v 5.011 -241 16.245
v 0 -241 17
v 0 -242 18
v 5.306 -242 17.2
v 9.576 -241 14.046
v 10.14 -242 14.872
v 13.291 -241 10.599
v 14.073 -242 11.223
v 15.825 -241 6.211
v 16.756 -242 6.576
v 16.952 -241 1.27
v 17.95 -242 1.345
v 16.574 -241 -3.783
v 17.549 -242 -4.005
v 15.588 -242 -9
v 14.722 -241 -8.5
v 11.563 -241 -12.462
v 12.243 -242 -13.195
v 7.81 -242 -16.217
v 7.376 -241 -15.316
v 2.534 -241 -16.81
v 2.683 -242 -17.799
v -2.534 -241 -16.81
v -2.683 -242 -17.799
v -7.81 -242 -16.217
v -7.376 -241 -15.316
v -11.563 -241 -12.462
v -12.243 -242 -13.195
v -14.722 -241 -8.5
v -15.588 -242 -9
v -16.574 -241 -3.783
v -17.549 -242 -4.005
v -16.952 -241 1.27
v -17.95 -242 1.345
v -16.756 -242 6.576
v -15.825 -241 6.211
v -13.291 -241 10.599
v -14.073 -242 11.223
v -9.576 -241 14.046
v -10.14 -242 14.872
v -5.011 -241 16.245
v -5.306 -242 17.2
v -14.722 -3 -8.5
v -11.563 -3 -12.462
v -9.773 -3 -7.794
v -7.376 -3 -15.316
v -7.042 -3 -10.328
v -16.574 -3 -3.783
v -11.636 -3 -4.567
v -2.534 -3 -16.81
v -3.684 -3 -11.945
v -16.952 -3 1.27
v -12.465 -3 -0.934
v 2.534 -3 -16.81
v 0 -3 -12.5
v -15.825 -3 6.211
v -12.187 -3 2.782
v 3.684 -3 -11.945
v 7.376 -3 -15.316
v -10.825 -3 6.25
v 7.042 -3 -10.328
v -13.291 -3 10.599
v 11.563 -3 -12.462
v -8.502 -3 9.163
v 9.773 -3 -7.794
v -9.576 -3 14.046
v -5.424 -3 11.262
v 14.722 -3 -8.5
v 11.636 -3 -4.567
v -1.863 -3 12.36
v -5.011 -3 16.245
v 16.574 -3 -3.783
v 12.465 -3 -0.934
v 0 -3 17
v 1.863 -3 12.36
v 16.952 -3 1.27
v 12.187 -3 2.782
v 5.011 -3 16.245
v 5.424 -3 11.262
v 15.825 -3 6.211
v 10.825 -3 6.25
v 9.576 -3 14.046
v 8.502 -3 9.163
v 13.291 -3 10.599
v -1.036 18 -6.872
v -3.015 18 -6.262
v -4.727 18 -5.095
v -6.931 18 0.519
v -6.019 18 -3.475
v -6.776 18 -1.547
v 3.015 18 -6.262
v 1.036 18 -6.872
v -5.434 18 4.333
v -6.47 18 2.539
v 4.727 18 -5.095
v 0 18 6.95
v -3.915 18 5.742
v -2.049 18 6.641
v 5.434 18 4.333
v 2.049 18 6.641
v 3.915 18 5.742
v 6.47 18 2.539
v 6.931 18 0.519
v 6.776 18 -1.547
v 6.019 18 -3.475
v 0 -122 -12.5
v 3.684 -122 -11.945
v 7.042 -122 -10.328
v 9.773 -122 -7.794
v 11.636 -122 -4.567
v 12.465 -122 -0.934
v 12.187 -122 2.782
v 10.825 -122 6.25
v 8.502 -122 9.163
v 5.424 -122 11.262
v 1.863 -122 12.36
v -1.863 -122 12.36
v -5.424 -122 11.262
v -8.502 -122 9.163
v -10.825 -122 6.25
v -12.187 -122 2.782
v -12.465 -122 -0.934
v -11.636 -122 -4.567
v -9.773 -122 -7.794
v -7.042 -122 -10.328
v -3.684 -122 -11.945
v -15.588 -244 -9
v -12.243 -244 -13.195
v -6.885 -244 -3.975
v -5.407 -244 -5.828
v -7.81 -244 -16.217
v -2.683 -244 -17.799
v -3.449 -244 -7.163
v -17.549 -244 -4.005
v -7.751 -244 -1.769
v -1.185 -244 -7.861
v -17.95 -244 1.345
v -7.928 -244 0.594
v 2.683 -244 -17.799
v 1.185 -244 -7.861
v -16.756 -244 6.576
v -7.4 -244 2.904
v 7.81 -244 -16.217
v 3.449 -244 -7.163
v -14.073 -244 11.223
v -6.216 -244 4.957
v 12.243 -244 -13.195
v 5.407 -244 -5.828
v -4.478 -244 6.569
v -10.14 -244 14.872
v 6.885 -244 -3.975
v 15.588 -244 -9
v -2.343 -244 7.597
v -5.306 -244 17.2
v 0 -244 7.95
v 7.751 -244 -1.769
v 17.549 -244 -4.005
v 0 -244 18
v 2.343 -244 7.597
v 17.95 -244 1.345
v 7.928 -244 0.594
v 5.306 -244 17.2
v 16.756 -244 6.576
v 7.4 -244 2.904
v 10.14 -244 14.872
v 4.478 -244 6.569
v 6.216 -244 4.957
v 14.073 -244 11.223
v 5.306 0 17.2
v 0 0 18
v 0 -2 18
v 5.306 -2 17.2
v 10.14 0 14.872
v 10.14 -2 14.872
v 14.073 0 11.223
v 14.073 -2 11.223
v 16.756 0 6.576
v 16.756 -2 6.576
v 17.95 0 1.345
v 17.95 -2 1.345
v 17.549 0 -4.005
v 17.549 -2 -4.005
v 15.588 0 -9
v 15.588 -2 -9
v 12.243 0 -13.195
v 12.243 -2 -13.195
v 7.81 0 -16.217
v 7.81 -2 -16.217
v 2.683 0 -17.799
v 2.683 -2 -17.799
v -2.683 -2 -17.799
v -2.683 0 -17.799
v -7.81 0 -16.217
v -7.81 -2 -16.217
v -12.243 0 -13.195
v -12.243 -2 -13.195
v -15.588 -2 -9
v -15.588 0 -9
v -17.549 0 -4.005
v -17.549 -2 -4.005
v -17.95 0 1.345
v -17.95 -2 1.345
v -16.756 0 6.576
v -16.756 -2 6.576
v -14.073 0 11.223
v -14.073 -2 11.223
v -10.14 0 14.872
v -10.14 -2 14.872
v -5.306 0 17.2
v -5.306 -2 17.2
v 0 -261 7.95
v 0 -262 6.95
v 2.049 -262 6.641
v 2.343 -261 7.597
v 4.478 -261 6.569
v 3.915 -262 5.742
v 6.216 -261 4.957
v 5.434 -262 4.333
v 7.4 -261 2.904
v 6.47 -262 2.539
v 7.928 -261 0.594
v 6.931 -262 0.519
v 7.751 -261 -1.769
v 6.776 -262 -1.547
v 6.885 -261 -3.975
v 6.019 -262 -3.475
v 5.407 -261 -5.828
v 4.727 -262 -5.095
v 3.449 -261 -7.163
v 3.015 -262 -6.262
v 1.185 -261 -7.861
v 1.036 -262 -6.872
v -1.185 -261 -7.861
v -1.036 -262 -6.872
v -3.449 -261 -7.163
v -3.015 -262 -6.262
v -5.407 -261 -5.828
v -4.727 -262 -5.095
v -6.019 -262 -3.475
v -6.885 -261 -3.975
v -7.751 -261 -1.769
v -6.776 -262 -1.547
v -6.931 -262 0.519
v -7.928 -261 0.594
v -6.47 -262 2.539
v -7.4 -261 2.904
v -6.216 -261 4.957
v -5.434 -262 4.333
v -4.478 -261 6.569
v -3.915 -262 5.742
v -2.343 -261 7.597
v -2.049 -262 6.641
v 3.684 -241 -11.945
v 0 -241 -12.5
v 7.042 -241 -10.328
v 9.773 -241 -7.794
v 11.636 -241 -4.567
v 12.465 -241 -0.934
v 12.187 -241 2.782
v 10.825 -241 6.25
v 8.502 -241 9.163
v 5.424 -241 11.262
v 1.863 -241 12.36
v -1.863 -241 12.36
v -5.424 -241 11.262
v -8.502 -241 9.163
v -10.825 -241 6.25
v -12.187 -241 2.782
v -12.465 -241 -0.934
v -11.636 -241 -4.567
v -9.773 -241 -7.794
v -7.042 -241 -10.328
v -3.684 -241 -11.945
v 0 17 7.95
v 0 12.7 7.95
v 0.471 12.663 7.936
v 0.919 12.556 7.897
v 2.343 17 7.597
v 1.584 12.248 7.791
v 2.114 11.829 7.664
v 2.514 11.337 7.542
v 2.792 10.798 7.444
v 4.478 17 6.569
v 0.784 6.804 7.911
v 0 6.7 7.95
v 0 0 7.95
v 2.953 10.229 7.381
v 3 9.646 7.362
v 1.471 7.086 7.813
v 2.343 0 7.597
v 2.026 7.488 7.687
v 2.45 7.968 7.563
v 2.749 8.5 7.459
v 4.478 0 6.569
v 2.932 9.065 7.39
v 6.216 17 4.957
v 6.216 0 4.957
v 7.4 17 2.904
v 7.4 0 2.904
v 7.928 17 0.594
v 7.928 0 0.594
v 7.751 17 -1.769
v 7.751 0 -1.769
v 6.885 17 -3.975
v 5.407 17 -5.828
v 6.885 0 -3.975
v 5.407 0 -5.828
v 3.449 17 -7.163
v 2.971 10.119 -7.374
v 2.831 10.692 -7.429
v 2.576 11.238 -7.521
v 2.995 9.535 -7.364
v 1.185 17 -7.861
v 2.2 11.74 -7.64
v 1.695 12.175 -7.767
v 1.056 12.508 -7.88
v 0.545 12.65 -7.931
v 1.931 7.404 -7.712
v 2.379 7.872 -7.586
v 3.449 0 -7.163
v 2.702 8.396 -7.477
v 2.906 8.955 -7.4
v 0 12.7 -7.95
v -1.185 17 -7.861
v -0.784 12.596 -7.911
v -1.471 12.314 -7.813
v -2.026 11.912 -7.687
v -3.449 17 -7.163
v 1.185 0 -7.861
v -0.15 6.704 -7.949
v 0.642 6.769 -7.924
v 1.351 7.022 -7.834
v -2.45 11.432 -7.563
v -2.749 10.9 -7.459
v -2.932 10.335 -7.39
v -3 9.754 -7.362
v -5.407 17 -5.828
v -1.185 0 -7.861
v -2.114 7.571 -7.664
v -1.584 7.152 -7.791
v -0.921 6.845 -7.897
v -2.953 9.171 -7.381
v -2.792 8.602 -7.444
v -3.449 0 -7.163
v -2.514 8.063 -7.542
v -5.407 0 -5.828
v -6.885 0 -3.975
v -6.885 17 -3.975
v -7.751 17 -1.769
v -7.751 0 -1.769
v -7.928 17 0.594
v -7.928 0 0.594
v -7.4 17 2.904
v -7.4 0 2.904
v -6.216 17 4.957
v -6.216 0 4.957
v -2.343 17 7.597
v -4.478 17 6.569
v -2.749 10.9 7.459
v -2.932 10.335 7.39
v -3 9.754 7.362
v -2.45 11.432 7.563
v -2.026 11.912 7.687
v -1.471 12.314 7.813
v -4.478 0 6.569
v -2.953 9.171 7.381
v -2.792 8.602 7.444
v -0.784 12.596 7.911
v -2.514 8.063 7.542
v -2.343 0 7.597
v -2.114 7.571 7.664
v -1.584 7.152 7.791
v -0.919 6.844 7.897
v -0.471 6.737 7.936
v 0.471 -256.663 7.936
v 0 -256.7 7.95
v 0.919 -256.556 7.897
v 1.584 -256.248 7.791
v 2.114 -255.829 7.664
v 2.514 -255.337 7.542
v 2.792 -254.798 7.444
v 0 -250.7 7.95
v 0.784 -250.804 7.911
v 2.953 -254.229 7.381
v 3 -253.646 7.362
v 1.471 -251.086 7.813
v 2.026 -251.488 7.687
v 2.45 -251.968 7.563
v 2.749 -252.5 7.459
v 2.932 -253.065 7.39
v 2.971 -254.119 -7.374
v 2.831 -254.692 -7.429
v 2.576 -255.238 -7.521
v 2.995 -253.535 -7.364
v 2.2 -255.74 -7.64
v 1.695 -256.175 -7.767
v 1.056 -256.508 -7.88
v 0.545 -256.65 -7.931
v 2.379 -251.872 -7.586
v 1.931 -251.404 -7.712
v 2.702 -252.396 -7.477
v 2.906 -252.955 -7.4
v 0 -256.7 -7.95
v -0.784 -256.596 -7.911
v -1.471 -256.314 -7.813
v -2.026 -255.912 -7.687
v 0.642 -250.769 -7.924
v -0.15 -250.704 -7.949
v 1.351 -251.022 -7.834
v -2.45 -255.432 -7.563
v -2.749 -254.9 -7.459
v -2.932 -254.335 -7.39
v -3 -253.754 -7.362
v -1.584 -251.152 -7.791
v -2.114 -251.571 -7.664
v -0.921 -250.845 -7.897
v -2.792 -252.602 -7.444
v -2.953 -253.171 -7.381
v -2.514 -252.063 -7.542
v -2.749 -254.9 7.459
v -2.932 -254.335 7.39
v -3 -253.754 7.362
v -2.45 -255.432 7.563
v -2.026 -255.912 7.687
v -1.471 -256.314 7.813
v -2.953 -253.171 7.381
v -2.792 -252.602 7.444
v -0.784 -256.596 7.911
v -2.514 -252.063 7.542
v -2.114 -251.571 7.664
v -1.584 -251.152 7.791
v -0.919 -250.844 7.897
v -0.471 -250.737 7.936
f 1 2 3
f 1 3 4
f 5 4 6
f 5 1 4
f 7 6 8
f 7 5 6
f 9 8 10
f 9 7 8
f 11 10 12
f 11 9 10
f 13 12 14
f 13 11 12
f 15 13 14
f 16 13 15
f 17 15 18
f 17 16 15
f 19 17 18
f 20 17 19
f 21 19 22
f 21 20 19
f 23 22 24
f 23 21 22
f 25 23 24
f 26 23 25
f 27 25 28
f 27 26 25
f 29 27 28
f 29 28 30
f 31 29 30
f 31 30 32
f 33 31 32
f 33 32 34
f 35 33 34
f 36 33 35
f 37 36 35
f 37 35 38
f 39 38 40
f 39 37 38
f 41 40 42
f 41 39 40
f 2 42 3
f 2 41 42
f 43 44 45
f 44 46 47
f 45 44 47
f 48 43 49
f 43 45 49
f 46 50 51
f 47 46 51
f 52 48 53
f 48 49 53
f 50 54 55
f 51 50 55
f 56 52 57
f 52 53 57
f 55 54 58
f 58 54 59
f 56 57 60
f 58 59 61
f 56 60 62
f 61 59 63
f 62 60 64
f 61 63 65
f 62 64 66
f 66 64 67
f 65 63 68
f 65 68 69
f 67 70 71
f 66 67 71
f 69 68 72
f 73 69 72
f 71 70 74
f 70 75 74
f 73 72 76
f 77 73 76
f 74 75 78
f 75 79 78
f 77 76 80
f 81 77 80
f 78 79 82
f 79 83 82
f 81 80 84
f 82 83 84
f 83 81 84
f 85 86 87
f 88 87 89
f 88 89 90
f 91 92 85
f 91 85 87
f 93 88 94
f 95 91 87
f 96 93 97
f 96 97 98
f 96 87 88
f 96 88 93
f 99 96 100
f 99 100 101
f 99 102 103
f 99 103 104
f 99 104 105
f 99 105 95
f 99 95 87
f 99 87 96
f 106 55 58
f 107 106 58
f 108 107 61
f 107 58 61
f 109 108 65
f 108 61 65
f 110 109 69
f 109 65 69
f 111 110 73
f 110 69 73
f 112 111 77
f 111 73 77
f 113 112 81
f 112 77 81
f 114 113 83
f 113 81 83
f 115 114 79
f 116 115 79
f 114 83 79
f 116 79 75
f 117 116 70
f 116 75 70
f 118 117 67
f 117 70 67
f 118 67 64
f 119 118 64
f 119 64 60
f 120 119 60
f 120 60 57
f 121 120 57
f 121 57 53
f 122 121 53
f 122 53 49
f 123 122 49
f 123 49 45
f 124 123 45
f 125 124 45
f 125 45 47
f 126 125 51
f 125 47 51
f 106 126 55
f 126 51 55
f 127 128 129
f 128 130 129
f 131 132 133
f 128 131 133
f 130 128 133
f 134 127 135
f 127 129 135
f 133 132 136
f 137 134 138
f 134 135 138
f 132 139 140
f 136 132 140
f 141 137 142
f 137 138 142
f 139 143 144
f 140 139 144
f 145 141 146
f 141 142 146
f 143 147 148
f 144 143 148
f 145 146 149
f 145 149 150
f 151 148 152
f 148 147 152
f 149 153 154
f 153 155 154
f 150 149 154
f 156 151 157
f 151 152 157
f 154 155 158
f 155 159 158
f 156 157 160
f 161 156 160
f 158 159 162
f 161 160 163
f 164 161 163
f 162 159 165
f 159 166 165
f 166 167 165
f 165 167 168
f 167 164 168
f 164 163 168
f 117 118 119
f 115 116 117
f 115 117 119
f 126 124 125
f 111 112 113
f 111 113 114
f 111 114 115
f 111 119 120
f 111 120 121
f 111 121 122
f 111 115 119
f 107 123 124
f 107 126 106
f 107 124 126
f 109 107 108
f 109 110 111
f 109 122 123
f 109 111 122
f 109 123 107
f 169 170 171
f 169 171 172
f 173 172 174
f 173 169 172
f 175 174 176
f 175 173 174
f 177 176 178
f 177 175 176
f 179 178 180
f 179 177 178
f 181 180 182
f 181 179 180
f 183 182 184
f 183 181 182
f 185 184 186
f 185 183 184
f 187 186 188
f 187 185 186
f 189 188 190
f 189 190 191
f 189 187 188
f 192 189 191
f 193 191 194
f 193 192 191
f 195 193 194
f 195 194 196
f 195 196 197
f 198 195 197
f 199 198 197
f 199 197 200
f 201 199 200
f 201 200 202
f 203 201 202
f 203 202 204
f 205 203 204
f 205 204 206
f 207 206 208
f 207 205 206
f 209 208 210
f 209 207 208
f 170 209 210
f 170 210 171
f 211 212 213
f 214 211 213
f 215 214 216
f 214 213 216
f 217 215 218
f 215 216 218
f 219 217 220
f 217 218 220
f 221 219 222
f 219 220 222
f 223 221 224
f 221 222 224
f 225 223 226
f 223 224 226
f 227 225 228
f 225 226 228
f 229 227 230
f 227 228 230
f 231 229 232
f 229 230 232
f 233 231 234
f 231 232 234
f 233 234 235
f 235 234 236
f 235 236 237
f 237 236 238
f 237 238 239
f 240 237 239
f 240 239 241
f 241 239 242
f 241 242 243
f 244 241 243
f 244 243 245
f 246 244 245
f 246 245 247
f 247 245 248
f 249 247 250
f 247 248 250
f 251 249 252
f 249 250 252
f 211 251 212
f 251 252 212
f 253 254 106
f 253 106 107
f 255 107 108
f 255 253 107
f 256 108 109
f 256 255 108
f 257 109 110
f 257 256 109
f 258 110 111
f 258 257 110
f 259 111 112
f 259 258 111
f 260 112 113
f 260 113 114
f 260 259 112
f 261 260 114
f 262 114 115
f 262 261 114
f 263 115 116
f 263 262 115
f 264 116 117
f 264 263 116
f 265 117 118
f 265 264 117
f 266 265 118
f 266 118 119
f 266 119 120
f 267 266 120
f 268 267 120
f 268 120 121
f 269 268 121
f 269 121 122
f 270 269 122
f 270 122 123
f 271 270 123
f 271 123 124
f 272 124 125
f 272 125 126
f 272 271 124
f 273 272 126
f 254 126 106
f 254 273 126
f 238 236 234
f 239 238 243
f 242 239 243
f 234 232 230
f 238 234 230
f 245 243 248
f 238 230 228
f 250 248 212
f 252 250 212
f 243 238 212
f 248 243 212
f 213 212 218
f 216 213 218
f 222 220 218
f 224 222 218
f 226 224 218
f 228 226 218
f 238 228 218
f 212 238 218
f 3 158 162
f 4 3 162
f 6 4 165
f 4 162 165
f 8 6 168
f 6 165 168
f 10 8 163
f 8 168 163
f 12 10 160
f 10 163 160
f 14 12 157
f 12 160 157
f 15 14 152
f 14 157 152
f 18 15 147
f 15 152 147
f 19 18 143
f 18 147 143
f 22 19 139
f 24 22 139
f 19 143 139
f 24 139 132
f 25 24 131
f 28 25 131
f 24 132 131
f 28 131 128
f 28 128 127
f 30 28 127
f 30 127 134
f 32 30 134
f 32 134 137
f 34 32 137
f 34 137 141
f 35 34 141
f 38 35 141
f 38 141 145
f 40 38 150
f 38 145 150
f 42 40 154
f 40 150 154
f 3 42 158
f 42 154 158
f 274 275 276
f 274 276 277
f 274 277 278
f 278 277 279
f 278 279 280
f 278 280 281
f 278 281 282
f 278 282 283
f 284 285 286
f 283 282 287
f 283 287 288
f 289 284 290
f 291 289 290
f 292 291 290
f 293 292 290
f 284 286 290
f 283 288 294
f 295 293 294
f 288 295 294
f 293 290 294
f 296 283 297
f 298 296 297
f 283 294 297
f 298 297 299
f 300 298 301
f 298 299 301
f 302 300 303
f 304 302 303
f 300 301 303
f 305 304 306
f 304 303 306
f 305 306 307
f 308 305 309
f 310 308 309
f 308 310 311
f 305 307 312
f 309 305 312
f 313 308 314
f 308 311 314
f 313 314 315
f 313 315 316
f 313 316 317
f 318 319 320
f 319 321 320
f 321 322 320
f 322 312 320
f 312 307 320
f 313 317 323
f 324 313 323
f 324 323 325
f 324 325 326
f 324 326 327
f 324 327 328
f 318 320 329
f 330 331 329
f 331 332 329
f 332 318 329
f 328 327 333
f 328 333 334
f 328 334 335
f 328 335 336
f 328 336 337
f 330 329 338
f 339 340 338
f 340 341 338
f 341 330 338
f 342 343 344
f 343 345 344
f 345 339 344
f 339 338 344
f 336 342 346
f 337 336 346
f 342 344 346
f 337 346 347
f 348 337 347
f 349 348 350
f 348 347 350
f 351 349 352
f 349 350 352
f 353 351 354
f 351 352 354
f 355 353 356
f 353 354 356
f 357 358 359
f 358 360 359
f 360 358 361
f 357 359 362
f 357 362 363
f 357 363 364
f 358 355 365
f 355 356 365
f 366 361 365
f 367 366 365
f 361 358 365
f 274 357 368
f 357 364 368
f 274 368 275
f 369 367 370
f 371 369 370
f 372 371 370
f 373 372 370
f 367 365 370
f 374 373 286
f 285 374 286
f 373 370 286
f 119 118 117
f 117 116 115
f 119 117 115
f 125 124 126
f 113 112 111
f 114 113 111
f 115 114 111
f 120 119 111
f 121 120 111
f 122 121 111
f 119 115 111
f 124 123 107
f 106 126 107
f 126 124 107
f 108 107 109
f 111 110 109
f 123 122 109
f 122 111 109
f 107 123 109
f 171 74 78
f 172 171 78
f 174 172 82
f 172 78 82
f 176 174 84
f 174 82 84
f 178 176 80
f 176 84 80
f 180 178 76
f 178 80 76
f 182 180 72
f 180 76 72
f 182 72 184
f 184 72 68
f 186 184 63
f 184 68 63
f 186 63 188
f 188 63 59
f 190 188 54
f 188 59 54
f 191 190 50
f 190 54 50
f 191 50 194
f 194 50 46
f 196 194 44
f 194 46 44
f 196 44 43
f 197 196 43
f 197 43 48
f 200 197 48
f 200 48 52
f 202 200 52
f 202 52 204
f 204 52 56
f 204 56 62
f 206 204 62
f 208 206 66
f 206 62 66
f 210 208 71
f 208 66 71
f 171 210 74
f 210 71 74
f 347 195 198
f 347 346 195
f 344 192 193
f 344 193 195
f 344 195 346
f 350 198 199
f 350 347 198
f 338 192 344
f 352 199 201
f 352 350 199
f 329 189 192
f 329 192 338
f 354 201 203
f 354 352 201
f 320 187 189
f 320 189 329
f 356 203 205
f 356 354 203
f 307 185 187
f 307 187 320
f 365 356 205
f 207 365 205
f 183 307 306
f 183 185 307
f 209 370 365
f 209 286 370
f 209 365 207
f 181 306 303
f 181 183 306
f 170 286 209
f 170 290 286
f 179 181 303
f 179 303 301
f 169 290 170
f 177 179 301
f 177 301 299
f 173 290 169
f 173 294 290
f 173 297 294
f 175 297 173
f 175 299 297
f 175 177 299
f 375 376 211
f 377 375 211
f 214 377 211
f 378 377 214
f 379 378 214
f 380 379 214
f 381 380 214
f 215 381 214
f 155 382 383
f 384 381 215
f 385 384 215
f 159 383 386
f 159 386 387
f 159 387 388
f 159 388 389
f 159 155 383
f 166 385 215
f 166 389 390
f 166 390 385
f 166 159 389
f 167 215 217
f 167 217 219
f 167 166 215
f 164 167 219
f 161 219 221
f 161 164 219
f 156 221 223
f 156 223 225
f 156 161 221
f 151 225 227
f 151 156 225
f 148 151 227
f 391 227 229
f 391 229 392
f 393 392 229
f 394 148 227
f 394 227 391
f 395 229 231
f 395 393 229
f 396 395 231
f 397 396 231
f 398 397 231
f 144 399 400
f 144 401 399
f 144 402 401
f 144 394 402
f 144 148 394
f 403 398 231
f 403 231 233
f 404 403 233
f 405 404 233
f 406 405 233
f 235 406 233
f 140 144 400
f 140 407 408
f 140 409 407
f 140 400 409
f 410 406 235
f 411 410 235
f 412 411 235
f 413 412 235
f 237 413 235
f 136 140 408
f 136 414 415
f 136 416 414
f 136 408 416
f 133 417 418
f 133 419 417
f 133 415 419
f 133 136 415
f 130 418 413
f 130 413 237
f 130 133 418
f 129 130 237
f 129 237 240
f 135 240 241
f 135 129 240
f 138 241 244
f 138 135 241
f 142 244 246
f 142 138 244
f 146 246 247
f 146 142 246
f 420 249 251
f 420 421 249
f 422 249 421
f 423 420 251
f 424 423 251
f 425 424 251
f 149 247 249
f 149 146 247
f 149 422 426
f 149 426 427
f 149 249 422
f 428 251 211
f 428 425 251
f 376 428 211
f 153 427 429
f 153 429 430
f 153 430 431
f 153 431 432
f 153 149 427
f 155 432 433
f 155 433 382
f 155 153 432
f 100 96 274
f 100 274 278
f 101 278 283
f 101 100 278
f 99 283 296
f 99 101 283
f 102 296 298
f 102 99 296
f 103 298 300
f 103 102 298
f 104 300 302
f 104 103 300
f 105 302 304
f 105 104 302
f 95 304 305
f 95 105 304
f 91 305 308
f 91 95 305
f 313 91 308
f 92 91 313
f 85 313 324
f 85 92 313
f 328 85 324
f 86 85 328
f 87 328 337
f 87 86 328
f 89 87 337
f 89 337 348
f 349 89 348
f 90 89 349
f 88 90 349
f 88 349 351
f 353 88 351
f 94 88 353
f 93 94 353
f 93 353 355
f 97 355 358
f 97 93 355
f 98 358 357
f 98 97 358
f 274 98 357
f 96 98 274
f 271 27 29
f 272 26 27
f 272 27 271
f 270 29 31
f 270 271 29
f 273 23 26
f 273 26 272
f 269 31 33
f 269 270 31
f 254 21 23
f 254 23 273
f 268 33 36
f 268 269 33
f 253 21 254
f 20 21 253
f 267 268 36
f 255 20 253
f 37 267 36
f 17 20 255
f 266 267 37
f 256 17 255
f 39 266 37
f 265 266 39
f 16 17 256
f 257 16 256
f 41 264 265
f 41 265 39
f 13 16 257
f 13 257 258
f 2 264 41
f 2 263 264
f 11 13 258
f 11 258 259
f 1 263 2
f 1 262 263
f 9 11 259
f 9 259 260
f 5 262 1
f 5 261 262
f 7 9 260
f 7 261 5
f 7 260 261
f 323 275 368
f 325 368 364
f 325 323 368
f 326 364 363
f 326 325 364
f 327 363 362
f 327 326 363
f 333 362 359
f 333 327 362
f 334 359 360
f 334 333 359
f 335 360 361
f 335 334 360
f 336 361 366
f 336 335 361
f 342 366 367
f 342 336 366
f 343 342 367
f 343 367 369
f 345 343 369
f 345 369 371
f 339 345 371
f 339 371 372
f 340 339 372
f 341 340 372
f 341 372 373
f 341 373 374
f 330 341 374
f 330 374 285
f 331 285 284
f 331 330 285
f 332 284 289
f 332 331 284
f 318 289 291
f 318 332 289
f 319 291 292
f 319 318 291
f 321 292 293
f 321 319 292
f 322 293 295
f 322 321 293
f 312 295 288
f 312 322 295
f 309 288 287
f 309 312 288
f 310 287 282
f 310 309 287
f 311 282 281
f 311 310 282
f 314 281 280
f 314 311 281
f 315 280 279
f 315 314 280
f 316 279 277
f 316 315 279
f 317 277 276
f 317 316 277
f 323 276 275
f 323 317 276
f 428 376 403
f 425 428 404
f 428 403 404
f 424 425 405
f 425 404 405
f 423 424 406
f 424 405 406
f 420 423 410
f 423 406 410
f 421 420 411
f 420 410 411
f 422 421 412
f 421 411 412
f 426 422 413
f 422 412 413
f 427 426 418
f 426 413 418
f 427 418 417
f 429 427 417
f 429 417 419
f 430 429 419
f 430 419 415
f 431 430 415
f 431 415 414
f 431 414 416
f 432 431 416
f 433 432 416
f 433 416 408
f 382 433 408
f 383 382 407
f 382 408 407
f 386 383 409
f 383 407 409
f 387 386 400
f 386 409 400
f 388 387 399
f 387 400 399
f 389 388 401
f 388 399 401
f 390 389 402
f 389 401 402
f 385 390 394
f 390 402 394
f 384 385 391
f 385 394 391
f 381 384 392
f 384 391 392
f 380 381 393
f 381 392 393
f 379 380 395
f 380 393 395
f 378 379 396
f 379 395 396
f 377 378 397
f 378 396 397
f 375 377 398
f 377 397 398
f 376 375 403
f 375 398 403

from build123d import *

# Parameters (mm, degrees)
SKETCH_1_R               = 7.95
EXTRUDE_1_DEPTH          = 18
CHAMFER_2_SIZE           = 1
CUT_EXTRUDE_2_DEPTH      = 22.22274723
CUT_EXTRUDE_2_DEPTH_BACK = 22.22274723
SKETCH_9_R               = 3
SKETCH_4_R               = 18
EXTRUDE_2_DEPTH          = 3
CHAMFER_1_SIZE           = 1
SKETCH_5_R               = 12.5
EXTRUDE_3_DEPTH          = 119


with BuildPart() as part:
    # 草图1 → 凸台-拉伸1 (new body)
    with BuildSketch(Plane(origin=(0, 0, 0), x_dir=(1, 0, 0), z_dir=(0, 1, 0))):
        with Locations(Location((0, 0, 0), (0, 0, 270))):
            Circle(SKETCH_1_R)
    extrude(amount=EXTRUDE_1_DEPTH)

    # 倒角2
    chamfer_2_edges = [part.edges().sort_by_distance(p)[0] for p in [
        (0, 18, -7.95),
    ]]
    chamfer(chamfer_2_edges, length=CHAMFER_2_SIZE)

    # 草图9 → 切除-拉伸2 (cut, two sides: drawn at the far end of the back side and taken through both)
    with BuildSketch(Plane.XY.offset(-CUT_EXTRUDE_2_DEPTH_BACK)):
        with Locations(Location((0, 9.7, 0), (0, 0, 89.999999999))):
            Circle(SKETCH_9_R)
    extrude(amount=CUT_EXTRUDE_2_DEPTH + CUT_EXTRUDE_2_DEPTH_BACK, mode=Mode.SUBTRACT)

    # 草图4 → 凸台-拉伸2 (add)
    with BuildSketch(Plane(origin=(0, 0, 0), x_dir=(1, 0, 0), z_dir=(0, 1, 0))):
        with Locations(Location((0, 0, 0), (0, 0, 270))):
            Circle(SKETCH_4_R)
    extrude(amount=-EXTRUDE_2_DEPTH)

    # 倒角1
    chamfer_1_edges = [part.edges().sort_by_distance(p)[0] for p in [
        (0, -3, -18),
    ]]
    chamfer(chamfer_1_edges, length=CHAMFER_1_SIZE)

    # 草图5 → 凸台-拉伸3 (add)
    with BuildSketch(Plane(origin=(0, -3, 0), x_dir=(-1, 0, 0), z_dir=(0, -1, 0))):
        with Locations(Location((0, 0, 0), (0, 0, 90))):
            Circle(SKETCH_5_R)
    extrude(amount=EXTRUDE_3_DEPTH)


with BuildPart() as body_2:
    # 镜向3: mirrored copy
    add(part.part.mirror(Plane(origin=(0, -122, 0), x_dir=(0, 0, 1), z_dir=(0, -1, 0))))


solid = Compound([part.part, body_2.part])
